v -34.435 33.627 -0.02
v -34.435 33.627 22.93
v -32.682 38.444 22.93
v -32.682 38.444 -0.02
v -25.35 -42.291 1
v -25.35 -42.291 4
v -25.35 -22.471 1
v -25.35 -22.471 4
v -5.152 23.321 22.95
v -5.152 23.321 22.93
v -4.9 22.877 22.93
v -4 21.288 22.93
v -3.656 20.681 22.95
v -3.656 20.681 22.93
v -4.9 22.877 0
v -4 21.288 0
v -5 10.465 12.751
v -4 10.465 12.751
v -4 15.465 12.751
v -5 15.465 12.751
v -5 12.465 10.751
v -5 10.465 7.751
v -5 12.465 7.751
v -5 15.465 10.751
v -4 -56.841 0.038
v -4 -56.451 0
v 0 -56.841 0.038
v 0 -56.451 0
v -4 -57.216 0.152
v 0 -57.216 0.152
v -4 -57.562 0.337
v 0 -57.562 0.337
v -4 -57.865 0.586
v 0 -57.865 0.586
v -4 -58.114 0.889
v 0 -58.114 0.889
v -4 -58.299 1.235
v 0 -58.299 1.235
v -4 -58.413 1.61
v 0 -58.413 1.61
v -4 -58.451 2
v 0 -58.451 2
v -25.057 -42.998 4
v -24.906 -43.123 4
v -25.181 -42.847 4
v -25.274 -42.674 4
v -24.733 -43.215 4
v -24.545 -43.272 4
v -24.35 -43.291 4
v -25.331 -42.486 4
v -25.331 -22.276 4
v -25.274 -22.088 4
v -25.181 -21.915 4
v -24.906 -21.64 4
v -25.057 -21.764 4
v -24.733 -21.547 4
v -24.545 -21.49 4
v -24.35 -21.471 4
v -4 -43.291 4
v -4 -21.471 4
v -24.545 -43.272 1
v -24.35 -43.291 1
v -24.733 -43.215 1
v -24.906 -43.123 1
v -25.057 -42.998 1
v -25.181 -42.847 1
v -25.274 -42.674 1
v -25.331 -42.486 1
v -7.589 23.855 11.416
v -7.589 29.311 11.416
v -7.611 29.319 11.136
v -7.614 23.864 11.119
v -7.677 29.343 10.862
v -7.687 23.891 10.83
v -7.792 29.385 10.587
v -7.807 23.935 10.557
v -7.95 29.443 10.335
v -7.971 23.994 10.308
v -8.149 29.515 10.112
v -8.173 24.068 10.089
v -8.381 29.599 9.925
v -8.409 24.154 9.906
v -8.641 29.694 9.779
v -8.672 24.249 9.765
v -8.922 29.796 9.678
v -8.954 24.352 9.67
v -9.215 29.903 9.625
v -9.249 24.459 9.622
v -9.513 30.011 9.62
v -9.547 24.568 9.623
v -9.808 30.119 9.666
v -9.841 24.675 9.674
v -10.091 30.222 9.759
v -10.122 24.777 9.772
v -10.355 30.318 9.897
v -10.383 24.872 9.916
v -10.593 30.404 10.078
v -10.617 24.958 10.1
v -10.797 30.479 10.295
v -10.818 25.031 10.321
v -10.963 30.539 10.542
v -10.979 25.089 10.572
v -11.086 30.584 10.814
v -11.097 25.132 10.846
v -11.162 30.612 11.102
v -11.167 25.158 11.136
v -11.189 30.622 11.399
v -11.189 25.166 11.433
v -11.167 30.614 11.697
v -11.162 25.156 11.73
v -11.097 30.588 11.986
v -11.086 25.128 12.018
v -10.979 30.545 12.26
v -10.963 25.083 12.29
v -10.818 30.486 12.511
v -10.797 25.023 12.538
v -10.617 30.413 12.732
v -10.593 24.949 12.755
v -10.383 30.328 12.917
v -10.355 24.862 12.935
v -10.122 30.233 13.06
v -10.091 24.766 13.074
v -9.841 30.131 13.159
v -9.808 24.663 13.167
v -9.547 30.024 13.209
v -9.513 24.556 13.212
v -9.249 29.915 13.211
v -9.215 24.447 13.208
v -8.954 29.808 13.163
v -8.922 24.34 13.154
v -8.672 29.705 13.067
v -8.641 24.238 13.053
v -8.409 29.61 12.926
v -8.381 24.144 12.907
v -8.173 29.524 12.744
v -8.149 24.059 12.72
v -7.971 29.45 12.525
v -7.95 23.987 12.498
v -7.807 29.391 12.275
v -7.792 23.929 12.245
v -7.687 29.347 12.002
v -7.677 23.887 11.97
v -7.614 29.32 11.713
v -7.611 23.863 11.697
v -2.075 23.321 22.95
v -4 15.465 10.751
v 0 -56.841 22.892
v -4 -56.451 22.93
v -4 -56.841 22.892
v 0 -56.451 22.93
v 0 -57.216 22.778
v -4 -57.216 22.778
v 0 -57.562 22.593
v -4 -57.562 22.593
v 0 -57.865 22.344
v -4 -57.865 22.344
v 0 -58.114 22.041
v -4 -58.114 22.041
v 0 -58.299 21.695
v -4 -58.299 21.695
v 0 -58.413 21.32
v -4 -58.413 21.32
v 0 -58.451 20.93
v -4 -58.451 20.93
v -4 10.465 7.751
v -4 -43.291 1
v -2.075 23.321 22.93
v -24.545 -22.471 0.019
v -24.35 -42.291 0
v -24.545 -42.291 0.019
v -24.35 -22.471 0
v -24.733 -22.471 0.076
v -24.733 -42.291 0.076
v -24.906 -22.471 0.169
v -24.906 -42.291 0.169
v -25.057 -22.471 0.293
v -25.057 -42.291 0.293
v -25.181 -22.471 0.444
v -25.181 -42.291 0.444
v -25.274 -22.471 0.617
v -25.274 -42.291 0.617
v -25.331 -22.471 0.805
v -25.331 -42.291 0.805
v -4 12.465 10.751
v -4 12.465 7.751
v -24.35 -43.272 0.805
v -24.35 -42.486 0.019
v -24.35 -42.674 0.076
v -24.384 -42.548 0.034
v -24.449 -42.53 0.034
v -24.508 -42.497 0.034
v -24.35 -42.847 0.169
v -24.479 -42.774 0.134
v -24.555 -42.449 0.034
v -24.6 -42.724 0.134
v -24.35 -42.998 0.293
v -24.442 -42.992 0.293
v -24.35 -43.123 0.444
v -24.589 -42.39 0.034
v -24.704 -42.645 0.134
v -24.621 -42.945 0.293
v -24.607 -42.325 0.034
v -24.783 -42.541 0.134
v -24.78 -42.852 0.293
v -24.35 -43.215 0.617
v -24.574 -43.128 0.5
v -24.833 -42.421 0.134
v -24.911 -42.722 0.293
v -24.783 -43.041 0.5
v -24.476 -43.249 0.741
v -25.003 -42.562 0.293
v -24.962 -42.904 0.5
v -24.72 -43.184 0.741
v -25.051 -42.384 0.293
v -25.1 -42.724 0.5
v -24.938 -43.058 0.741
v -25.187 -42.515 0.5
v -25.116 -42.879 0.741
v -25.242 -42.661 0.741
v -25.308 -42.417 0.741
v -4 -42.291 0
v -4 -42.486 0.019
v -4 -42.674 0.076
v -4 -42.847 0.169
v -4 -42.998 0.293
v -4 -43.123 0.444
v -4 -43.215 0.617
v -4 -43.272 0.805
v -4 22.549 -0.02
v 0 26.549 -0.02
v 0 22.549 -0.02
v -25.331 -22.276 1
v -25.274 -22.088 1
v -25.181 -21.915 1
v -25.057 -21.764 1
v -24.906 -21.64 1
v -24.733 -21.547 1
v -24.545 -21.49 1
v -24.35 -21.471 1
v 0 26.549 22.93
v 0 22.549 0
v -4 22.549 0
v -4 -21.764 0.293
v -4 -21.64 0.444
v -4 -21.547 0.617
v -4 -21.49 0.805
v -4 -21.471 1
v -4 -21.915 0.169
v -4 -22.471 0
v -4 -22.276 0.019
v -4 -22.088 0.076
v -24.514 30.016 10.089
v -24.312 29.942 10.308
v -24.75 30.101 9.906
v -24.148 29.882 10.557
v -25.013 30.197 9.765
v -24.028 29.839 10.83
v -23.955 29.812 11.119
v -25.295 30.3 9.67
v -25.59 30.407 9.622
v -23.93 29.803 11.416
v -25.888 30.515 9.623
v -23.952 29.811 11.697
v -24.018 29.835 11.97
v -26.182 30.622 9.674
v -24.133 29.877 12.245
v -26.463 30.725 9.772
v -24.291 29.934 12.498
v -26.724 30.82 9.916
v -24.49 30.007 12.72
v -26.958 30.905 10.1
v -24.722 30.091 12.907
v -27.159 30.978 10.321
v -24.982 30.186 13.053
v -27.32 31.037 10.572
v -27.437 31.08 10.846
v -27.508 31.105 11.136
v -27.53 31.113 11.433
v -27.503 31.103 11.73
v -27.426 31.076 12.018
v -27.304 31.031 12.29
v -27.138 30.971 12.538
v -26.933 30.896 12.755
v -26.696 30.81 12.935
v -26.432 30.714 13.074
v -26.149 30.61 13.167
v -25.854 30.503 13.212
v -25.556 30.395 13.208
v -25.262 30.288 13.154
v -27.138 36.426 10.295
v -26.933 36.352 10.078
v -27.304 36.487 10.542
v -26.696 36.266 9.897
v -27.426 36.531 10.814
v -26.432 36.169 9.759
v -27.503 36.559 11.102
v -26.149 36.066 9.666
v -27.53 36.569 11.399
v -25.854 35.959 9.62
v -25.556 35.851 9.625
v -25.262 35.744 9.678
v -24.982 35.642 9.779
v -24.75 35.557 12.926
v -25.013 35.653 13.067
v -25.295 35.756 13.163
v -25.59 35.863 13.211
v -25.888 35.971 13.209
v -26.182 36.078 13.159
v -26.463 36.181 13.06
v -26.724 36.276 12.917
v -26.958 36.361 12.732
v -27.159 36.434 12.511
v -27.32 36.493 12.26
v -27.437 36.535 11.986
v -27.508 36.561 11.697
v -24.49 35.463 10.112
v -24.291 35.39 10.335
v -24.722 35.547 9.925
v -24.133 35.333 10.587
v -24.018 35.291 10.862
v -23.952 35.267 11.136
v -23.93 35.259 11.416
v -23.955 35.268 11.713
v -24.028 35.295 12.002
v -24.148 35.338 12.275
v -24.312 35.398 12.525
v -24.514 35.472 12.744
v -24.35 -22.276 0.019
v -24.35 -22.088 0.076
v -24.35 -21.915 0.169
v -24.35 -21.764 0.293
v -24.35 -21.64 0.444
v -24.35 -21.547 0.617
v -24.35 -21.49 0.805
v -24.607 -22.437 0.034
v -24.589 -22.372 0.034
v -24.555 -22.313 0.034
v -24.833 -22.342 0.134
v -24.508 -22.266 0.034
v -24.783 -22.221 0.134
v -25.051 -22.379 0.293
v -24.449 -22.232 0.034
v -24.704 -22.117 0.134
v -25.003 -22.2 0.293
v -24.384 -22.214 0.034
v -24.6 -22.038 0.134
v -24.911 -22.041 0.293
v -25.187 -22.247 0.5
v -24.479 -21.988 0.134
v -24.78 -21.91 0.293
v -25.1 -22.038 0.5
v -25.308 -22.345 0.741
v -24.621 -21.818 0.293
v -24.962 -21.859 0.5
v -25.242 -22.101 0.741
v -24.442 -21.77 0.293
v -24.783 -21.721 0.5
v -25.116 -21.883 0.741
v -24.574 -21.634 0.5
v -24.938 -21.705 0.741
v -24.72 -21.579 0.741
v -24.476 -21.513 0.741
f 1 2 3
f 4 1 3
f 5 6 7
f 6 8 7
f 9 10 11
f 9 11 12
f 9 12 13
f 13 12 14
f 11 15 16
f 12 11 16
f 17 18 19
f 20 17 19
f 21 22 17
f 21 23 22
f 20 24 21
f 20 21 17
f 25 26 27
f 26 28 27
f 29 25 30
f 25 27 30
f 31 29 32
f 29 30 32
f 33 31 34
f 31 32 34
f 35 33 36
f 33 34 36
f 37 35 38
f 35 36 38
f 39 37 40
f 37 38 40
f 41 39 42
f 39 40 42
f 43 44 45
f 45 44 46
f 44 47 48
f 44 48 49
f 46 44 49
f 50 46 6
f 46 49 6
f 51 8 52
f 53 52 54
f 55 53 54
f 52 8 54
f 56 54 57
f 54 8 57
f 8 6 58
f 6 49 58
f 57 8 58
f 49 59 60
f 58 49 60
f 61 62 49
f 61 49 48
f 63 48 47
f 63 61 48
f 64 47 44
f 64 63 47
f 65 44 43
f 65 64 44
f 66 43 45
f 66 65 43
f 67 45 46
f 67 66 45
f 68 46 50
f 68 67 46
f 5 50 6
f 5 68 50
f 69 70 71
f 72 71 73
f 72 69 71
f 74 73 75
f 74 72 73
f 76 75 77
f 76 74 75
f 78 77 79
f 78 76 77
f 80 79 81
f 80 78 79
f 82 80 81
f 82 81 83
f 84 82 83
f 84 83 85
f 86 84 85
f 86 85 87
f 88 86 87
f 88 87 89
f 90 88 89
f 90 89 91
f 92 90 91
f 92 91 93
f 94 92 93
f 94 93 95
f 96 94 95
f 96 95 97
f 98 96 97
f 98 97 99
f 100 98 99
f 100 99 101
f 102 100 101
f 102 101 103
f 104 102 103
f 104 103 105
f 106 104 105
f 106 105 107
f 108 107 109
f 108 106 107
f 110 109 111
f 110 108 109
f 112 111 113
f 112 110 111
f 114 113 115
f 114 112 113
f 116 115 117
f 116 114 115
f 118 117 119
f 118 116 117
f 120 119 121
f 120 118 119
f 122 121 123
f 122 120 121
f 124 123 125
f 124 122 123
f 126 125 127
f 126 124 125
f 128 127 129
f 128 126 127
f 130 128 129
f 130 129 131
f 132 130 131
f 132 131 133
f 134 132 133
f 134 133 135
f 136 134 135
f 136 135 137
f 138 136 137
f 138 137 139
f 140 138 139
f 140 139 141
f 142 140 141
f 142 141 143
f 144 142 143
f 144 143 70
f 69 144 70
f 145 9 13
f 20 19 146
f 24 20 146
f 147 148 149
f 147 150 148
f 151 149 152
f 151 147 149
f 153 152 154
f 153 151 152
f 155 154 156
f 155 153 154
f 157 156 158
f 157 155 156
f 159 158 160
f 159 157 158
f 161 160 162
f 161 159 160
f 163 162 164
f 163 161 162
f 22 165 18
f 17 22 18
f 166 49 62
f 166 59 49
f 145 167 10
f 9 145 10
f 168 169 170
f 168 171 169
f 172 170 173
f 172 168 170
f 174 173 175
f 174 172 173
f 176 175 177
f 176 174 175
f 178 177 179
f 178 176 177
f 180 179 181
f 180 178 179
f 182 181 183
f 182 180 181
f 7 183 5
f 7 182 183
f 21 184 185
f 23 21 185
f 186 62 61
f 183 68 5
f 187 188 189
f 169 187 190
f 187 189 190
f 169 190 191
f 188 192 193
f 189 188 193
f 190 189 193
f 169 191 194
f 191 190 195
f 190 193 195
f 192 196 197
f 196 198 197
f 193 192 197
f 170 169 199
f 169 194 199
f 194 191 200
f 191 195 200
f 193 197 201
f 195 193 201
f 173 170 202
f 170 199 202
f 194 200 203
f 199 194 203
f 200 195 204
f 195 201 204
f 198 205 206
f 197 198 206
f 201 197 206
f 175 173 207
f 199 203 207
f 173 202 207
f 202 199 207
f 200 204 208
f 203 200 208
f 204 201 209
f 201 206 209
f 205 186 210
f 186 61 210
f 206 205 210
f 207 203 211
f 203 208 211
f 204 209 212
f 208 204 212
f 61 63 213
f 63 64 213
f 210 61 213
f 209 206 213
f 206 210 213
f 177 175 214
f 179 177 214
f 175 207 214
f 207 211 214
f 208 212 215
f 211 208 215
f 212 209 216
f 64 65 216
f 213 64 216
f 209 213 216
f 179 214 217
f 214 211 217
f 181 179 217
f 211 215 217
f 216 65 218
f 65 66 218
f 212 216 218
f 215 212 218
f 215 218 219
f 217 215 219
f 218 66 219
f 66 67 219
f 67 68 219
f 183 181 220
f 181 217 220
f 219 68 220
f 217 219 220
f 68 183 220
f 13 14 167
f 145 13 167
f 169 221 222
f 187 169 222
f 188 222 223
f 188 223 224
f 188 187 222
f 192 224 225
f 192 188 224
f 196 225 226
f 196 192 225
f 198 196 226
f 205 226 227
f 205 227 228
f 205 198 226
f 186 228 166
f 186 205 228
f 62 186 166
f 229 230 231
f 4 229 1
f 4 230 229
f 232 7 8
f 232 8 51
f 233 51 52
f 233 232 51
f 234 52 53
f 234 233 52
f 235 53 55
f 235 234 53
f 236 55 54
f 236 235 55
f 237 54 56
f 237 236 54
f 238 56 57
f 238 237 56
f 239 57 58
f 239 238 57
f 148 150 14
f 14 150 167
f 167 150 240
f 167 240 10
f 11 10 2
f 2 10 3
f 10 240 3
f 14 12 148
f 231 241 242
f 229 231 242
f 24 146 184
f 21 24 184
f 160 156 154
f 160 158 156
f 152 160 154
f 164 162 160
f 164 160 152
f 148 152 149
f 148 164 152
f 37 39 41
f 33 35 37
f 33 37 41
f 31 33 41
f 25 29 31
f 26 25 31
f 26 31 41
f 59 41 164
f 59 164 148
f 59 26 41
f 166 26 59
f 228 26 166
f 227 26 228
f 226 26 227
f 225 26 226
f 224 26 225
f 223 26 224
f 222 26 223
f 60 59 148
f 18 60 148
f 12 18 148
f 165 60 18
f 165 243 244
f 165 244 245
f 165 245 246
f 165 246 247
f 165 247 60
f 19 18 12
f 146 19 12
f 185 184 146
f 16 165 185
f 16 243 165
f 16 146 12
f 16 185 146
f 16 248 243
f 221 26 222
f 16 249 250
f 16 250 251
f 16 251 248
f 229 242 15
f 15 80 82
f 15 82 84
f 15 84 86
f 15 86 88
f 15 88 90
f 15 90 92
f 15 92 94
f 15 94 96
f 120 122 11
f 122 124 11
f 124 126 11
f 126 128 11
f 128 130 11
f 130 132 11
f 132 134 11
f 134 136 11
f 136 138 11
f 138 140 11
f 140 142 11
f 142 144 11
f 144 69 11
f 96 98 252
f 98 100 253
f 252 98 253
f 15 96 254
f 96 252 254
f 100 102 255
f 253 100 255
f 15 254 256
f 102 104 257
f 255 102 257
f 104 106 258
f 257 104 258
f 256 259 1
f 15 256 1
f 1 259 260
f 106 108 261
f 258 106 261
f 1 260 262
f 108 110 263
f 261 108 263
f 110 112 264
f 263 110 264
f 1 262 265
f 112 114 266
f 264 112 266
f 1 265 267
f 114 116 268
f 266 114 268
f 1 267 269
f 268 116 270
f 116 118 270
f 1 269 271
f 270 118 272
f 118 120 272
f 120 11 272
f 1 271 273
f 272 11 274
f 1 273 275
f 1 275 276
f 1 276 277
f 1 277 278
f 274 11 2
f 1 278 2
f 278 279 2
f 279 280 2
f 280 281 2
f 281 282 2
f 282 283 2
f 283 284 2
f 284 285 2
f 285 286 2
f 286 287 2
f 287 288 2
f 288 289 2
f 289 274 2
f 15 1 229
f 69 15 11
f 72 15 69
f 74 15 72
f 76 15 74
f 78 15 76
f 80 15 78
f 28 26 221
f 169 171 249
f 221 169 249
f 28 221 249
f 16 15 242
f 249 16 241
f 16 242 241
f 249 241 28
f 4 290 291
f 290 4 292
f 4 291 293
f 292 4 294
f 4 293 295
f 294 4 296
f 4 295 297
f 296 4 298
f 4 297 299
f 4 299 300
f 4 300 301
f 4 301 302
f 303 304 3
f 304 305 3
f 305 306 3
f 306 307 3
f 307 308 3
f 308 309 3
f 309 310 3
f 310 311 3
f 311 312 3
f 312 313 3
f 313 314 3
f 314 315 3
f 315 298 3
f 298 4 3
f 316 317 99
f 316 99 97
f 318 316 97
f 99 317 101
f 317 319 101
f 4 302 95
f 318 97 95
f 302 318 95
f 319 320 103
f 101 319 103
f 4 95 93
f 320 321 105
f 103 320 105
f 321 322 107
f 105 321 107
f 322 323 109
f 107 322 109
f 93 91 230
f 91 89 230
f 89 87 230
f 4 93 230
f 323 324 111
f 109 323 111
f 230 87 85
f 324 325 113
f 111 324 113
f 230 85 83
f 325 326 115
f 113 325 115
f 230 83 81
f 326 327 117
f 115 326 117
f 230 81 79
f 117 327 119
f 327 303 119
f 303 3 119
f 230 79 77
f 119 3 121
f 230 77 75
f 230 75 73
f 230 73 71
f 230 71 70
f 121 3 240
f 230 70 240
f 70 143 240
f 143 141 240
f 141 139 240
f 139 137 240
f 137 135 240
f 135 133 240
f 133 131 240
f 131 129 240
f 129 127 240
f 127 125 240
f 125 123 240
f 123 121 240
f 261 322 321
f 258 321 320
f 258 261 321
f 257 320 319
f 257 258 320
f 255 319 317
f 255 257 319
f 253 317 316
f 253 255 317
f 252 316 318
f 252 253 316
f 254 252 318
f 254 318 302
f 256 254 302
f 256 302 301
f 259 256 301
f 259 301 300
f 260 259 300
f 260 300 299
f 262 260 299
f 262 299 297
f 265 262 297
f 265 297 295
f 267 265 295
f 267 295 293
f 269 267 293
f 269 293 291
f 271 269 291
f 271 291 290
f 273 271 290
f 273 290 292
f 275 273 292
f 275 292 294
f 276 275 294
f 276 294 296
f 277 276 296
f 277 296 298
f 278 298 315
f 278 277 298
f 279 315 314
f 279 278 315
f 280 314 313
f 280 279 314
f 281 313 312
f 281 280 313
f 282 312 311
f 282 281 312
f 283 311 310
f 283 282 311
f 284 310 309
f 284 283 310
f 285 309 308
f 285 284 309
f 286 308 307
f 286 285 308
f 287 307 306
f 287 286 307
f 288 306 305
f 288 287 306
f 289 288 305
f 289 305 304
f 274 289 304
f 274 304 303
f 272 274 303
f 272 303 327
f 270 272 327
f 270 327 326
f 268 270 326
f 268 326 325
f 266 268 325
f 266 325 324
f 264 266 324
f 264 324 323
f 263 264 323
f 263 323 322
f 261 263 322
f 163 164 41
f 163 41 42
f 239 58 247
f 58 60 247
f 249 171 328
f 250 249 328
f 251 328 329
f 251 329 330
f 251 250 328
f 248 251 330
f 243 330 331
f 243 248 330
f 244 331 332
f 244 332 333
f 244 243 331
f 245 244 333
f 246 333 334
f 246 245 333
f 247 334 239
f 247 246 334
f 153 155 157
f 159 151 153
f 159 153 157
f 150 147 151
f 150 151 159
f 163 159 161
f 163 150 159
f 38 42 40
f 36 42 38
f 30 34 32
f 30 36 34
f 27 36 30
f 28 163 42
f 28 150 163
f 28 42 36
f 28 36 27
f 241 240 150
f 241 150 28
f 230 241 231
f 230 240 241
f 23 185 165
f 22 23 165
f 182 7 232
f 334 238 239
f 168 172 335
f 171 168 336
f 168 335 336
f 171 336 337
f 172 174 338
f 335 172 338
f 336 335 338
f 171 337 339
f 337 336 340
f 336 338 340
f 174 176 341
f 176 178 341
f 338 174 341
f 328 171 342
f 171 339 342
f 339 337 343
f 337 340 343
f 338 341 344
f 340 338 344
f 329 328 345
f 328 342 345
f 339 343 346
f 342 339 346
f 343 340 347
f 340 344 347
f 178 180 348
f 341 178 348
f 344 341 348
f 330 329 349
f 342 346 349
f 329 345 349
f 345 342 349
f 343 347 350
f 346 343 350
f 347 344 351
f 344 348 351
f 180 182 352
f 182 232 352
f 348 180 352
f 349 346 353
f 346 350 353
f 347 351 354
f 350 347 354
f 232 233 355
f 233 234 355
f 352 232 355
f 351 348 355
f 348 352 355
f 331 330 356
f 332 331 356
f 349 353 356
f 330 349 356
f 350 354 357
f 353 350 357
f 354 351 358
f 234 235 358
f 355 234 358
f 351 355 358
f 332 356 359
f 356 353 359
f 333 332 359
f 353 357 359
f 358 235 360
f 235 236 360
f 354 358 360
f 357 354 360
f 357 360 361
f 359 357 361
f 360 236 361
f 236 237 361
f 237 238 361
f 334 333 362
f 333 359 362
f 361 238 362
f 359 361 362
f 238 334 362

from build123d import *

# Parameters (mm, degrees)
ESQUISSE1_W             = 4
ESQUISSE1_H             = 85
BOSS_EXTRU_1_DEPTH      = 22.93
BOSS_EXTRU_5_DEPTH      = 22.95
CONG_1_R                = 2
ESQUISSE7_W             = 4
ESQUISSE7_H             = 21.820353027
BOSS_EXTRU_10_DEPTH     = 25.35
CONG_14_R               = 1
CONG_15_R               = 1
ESQUISSE9_R             = 1.8
ENL_V_MAT_EXTRU_1_DEPTH = 58
BOSS_EXTRU_11_DEPTH     = 1
BOSS_EXTRU_12_DEPTH     = 22.95


with BuildPart() as part:
    # Esquisse1 → Boss.-Extru.1 (new body)
    with BuildSketch(Plane.XY):
        with Locations((-2, -15.95097561)):
            Rectangle(ESQUISSE1_W, ESQUISSE1_H)
    extrude(amount=BOSS_EXTRU_1_DEPTH)

    # Esquisse2 → Boss.-Extru.5 (add)
    with BuildSketch(Plane.XY.offset(22.93)):
        Polygon((-32.681935281, 38.444276031), (0, 26.54902439), (0, 22.54902439), (-4, 22.54902439), (-34.435421614, 33.626611925), align=None)
    extrude(amount=-BOSS_EXTRU_5_DEPTH)

    # Congé1
    cong_1_edges = [part.edges().sort_by_distance(p)[0] for p in [
        (-2, -58.45097561, 22.93),
        (-2, -58.45097561, 0),
    ]]
    fillet(cong_1_edges, radius=CONG_1_R)

    # Esquisse7 → Boss.-Extru.10 (add)
    with BuildSketch(Plane(origin=(0, 0, 0), x_dir=(0, 0, -1), z_dir=(1, 0, 0))):
        with Locations((-2, -32.381152124)):
            Rectangle(ESQUISSE7_W, ESQUISSE7_H)
    extrude(amount=-BOSS_EXTRU_10_DEPTH)

    # Congé14
    cong_14_edges = [part.edges().sort_by_distance(p)[0] for p in [
        (-25.35, -43.291328637, 2),
        (-25.35, -21.47097561, 2),
    ]]
    fillet(cong_14_edges, radius=CONG_14_R)

    # Congé15
    cong_15_edges = [part.edges().sort_by_distance(p)[0] for p in [
        (-14.175, -43.291328637, 0),
        (-25.35, -32.381152123, 0),
        (-14.175, -21.47097561, 0),
        (-25.057106781, -21.763868829, 0),
        (-25.057106781, -42.998435418, 0),
    ]]
    fillet(cong_15_edges, radius=CONG_15_R)

    # Esquisse9 → Enlèv. mat.-Extru.1 (cut)
    with BuildSketch(Plane(origin=(0, 0, 0), x_dir=(1, 0, 0), z_dir=(0, 1, 0))):
        with Locations((-25.73017615, -11.416199304)):
            Circle(ESQUISSE9_R)
        with Locations((-9.38920851, -11.416199304)):
            Circle(ESQUISSE9_R)
    extrude(amount=ENL_V_MAT_EXTRU_1_DEPTH, mode=Mode.SUBTRACT)

    # Esquisse10 → Boss.-Extru.11 (add)
    with BuildSketch(Plane.ZY.offset(4)):
        Polygon((7.751431337, 10.464501792), (12.751431337, 10.464501792), (12.751431337, 15.464501792), (10.751431337, 15.464501792), (10.751431337, 12.464501792), (7.751431337, 12.464501792), align=None)
    extrude(amount=BOSS_EXTRU_11_DEPTH)

    # Esquisse13 → Boss.-Extru.12 (add)
    with BuildSketch(Plane.XY):
        Polygon((-5.151966744, 23.320636857), (-3.656231692, 20.681104413), (-2.075100003, 23.320636857), align=None)
    extrude(amount=BOSS_EXTRU_12_DEPTH)


solid = part.part
